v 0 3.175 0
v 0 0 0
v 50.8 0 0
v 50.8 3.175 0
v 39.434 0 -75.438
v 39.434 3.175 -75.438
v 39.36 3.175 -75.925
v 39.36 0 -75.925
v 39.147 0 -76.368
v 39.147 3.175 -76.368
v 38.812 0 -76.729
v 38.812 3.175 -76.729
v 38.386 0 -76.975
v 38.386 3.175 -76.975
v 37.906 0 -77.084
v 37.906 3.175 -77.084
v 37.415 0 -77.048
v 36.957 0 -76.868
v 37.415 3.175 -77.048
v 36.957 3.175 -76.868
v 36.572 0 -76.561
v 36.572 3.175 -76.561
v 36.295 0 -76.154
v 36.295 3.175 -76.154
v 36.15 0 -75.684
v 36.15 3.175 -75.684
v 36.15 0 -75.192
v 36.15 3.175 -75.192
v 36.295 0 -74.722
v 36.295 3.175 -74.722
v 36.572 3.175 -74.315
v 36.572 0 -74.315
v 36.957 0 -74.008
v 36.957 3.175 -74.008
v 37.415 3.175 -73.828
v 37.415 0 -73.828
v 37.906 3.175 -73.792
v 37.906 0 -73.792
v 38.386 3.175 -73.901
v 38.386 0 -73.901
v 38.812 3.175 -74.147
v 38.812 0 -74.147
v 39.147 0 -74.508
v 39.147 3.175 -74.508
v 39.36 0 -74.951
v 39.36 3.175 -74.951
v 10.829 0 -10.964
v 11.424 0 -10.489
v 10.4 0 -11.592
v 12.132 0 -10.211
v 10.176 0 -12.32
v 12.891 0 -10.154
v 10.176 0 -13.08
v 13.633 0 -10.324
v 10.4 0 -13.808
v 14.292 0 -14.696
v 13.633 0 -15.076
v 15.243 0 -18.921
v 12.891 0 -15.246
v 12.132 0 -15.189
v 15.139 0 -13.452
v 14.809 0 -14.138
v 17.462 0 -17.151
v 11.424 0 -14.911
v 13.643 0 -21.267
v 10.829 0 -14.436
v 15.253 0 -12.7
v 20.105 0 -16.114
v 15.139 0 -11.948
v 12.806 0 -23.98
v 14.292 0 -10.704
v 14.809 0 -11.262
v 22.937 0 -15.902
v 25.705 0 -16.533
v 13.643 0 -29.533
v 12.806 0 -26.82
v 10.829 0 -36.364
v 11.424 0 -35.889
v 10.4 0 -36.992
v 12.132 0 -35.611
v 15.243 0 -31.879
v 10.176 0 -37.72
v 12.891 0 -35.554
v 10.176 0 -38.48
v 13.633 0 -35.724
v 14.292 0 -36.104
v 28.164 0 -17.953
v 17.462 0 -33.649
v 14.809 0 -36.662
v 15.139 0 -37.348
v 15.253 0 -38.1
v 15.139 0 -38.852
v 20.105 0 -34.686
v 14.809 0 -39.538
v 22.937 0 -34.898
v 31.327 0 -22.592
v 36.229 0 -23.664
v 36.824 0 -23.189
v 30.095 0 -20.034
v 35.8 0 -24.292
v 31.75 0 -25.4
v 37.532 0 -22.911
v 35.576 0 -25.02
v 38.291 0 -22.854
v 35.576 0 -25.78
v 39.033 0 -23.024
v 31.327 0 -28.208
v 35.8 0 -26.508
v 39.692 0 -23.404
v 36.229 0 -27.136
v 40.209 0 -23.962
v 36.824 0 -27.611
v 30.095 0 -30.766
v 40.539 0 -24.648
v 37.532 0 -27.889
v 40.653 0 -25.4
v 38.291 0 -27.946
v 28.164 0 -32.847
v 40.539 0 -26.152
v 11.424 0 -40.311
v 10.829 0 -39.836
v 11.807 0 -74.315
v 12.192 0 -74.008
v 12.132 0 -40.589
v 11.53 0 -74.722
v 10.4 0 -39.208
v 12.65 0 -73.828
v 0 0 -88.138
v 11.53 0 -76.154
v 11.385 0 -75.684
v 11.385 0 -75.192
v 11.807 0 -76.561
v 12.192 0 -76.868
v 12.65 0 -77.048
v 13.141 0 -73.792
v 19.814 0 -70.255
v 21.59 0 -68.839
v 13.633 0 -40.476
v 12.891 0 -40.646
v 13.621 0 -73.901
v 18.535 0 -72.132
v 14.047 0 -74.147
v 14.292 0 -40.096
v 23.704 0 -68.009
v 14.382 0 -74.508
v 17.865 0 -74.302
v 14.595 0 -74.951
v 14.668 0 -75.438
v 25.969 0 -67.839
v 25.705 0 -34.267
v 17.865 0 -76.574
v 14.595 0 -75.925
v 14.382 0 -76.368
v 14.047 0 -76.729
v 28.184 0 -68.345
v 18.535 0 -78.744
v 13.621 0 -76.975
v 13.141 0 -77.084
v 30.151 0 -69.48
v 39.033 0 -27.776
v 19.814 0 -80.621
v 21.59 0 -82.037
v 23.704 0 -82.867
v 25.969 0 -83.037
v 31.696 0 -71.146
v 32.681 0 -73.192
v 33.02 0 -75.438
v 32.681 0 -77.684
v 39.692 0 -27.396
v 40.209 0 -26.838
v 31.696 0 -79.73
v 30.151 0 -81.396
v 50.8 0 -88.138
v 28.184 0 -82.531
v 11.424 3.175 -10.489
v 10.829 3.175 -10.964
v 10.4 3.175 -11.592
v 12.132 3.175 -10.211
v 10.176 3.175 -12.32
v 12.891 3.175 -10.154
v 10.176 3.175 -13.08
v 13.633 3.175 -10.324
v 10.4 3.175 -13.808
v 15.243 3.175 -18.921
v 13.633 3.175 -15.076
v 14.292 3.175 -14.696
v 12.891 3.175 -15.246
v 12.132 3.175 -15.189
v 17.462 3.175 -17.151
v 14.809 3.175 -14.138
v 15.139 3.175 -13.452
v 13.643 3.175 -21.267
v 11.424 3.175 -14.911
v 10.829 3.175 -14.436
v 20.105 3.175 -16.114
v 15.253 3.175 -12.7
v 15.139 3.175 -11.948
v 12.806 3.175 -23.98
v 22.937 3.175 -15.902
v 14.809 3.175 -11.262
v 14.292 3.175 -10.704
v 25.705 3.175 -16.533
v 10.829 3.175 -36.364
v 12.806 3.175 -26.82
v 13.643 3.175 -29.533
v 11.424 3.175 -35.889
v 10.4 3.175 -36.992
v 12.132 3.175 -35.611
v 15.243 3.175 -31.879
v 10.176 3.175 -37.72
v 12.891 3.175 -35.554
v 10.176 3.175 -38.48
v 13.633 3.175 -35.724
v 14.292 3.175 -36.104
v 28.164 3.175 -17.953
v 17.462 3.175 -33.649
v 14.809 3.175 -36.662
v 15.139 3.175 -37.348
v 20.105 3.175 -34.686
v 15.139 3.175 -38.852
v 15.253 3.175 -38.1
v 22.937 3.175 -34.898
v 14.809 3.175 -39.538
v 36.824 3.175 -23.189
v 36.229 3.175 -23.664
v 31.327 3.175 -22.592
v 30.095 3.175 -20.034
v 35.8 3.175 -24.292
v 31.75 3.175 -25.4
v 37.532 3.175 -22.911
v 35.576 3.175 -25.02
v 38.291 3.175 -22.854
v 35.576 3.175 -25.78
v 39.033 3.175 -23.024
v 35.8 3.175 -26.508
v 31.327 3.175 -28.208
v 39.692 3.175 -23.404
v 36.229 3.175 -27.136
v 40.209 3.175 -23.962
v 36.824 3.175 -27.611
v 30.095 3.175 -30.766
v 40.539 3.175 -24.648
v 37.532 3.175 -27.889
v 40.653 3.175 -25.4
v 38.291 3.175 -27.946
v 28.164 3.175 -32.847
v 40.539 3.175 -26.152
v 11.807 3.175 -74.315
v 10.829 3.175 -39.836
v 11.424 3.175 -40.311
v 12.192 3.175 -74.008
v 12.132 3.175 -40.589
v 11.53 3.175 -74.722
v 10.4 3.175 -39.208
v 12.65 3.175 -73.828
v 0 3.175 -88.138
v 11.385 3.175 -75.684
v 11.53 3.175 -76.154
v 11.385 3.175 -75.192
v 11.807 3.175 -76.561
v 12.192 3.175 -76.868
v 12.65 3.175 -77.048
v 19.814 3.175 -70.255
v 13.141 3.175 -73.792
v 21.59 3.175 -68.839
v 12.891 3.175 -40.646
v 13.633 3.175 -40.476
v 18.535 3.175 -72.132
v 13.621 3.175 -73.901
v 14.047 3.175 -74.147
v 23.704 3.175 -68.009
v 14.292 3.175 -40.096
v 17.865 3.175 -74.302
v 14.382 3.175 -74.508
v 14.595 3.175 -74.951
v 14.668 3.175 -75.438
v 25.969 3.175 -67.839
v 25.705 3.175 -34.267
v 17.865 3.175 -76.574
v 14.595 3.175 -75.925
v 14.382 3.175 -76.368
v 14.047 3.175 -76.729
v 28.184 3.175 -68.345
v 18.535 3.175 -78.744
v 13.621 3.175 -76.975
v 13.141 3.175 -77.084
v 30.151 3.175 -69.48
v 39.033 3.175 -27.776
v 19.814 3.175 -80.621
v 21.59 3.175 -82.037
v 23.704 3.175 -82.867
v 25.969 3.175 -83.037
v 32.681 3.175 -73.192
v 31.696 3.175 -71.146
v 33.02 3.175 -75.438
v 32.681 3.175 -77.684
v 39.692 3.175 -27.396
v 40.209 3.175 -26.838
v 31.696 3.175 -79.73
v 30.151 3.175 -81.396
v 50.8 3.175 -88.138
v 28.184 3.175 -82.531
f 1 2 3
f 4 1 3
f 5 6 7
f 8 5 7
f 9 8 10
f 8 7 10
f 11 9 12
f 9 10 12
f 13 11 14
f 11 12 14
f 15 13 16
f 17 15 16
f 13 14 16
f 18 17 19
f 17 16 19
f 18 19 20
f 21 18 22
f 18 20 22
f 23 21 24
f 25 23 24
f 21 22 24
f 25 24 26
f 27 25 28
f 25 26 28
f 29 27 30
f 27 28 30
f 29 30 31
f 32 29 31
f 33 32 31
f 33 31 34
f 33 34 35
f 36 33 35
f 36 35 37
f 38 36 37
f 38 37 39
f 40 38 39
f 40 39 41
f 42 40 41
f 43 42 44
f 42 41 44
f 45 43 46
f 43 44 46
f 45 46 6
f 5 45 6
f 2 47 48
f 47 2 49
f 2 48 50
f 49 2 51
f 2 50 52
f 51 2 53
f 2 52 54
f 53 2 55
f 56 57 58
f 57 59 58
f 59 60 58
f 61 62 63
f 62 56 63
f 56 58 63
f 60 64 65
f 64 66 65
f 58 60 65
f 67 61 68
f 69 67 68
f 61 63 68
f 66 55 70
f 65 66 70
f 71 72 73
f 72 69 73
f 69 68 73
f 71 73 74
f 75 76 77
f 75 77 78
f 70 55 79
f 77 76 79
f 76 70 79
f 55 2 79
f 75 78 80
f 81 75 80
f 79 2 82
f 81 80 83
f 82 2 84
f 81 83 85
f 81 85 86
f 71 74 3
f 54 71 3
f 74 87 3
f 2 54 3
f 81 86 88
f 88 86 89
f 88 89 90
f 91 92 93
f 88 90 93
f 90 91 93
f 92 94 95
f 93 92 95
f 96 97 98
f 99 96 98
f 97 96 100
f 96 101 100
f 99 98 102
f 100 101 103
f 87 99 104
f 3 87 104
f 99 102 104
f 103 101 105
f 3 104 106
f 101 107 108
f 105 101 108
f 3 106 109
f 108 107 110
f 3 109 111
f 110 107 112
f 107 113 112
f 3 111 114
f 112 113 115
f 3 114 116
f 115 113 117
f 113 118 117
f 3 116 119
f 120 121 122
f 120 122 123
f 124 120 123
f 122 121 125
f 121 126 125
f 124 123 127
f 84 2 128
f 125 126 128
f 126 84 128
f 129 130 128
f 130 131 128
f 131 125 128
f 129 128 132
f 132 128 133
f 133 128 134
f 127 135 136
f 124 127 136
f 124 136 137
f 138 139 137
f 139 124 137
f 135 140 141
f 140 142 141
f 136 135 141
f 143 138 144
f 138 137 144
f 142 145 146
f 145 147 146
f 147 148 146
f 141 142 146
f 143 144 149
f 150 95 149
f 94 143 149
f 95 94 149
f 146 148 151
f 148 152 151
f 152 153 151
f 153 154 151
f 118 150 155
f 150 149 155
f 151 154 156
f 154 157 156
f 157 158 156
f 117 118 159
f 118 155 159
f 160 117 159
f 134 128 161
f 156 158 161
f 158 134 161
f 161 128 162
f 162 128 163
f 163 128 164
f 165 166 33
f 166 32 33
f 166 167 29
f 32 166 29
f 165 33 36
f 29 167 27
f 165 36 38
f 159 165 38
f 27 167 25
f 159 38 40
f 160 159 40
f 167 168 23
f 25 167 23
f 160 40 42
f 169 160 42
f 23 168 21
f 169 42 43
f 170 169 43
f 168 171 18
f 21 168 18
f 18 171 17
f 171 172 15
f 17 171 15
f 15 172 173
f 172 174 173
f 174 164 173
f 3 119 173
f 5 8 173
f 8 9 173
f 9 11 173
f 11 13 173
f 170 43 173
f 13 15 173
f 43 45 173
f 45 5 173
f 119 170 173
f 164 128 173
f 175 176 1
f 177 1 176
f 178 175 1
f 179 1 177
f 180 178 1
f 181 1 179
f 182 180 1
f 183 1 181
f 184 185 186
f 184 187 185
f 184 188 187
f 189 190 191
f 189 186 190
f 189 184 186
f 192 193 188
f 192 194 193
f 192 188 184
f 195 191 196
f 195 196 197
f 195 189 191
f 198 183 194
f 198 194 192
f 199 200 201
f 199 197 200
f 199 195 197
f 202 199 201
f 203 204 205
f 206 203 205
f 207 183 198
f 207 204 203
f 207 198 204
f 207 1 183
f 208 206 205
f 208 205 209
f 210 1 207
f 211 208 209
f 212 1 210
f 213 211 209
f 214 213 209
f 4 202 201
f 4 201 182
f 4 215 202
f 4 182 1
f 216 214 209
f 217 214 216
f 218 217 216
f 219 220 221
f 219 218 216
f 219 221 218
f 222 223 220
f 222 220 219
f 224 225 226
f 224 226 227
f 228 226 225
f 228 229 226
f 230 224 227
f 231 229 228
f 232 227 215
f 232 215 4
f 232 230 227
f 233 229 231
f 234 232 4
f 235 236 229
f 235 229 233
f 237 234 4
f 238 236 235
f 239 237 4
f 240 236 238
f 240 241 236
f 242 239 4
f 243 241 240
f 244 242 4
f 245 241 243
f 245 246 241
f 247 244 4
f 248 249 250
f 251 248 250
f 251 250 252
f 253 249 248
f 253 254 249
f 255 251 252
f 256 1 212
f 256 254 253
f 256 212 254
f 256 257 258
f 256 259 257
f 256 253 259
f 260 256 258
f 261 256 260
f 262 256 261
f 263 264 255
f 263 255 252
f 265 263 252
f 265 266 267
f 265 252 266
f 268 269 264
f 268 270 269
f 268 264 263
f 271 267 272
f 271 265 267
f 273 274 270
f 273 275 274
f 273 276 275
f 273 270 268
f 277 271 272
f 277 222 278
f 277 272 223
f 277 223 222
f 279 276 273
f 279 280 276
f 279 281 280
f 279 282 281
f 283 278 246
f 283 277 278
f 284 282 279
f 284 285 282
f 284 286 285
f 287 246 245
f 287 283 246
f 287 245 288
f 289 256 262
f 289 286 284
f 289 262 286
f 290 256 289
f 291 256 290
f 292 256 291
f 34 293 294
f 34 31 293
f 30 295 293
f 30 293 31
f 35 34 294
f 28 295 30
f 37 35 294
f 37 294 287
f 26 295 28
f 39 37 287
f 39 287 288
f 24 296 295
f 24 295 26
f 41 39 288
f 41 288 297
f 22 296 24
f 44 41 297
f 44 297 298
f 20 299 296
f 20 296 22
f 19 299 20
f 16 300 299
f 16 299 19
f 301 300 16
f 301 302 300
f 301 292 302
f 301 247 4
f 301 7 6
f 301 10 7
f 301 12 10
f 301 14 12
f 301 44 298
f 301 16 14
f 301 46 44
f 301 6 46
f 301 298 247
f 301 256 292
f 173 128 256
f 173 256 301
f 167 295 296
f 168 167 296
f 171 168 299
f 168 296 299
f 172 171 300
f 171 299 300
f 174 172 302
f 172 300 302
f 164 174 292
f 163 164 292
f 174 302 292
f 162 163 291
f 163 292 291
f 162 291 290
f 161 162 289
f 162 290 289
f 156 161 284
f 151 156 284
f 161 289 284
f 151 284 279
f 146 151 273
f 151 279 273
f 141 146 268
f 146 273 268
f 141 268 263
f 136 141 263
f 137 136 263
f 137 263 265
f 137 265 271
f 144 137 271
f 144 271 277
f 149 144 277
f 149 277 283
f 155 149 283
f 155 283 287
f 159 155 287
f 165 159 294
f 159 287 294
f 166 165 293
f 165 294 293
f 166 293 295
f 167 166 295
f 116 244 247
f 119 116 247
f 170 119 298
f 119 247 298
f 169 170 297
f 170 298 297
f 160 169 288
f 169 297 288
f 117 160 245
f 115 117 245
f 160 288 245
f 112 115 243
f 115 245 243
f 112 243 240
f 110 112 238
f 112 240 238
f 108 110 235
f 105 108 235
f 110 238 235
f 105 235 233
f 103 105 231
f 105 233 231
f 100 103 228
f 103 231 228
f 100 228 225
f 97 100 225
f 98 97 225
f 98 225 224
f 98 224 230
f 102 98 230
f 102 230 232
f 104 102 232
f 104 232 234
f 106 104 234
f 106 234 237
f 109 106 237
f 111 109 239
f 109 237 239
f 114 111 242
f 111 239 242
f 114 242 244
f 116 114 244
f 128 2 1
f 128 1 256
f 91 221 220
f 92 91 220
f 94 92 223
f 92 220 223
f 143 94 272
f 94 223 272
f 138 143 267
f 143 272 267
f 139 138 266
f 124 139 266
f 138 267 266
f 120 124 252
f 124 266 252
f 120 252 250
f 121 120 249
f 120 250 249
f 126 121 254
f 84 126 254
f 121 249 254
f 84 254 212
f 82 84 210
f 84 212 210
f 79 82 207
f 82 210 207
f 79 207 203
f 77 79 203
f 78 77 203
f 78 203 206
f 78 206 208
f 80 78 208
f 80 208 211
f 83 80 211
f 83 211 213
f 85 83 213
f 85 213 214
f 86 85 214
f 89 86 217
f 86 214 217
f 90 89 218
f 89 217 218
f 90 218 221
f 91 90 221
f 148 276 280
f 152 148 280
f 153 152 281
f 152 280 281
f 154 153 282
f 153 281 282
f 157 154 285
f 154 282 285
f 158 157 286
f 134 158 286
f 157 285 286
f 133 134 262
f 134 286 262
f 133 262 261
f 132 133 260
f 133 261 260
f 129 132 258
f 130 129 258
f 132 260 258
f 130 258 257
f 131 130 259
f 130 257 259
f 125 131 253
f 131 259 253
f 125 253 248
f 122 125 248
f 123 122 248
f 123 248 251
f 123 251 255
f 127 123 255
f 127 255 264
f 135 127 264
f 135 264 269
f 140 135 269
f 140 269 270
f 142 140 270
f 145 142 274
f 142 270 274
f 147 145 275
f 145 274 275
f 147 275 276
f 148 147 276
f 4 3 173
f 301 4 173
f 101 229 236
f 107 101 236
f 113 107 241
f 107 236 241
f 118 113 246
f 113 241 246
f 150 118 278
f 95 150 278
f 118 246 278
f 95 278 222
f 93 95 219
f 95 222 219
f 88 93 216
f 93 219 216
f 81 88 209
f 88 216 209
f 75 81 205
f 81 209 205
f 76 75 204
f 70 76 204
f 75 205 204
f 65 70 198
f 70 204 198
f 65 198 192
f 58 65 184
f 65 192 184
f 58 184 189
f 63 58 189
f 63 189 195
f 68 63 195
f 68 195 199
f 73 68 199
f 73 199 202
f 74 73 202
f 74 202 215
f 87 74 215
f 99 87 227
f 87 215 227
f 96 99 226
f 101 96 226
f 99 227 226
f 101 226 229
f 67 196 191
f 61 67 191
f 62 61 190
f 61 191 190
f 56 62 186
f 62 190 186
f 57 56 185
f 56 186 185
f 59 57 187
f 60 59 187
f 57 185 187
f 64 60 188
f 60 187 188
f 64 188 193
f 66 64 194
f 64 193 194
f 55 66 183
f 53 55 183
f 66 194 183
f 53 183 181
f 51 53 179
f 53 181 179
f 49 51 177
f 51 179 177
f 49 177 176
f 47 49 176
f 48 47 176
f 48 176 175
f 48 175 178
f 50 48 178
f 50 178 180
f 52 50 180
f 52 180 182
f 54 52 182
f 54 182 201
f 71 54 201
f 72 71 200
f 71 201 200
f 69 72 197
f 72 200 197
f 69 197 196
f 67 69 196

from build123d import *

# Parameters (mm, degrees)
SKETCH1_W           = 50.8
SKETCH1_H           = 88.138
BOSS_EXTRUDE1_DEPTH = 3.175
SKETCH2_R           = 2.5527
SKETCH2_R_2         = 9.525
CUT_EXTRUDE1_DEPTH  = 3.175
SKETCH4_R           = 1.651
SKETCH4_R_2         = 7.62
CUT_EXTRUDE2_DEPTH  = 3.175


with BuildPart() as part:
    # Sketch1 → Boss-Extrude1 (new body)
    with BuildSketch(Plane(origin=(0, 0, 0), x_dir=(1, 0, 0), z_dir=(0, 1, 0))):
        with Locations((25.4, 44.069)):
            Rectangle(SKETCH1_W, SKETCH1_H)
    extrude(amount=BOSS_EXTRUDE1_DEPTH)

    # Sketch2 → Cut-Extrude1 (cut)
    with BuildSketch(Plane(origin=(0, 3.175, 0), x_dir=(1, 0, 0), z_dir=(0, 1, 0))):
        with Locations((12.7, 12.7)):
            Circle(SKETCH2_R)
        with Locations((12.7, 38.1)):
            Circle(SKETCH2_R)
        with Locations((38.1, 25.4)):
            Circle(SKETCH2_R)
        with Locations((22.225, 25.4)):
            Circle(SKETCH2_R_2)
    extrude(amount=-CUT_EXTRUDE1_DEPTH, mode=Mode.SUBTRACT)

    # Sketch4 → Cut-Extrude2 (cut)
    with BuildSketch(Plane(origin=(0, 3.175, 0), x_dir=(1, 0, 0), z_dir=(0, 1, 0))):
        with Locations((13.0175, 75.438)):
            Circle(SKETCH4_R)
        with Locations((37.7825, 75.438)):
            Circle(SKETCH4_R)
        with Locations((25.4, 75.438)):
            Circle(SKETCH4_R_2)
    extrude(amount=-CUT_EXTRUDE2_DEPTH, mode=Mode.SUBTRACT)


solid = part.part
